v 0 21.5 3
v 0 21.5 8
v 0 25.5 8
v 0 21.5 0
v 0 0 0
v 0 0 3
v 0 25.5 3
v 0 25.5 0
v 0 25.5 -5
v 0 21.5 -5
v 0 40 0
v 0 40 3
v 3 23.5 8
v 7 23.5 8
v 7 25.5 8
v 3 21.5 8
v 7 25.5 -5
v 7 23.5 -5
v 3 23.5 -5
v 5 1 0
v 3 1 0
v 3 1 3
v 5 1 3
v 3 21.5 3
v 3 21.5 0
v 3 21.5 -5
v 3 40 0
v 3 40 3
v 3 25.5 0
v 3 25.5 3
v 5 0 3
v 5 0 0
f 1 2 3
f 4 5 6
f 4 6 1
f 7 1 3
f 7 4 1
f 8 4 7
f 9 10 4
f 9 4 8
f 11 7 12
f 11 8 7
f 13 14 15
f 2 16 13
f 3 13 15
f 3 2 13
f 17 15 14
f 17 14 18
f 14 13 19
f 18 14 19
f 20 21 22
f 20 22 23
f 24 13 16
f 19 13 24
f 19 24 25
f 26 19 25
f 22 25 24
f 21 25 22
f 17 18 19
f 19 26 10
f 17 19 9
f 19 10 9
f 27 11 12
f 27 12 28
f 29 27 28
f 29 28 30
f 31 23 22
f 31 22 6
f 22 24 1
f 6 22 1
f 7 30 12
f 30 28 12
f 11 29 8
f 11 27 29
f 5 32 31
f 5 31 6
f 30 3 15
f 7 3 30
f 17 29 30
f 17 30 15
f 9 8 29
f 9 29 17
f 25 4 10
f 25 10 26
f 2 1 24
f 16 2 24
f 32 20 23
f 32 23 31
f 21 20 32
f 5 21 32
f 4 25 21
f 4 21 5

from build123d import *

# Parameters (mm, degrees)
BOSS_EXTRUDE1_DEPTH = 3
SKETCH2_W           = 3
SKETCH2_H           = 4
BOSS_EXTRUDE2_DEPTH = 5
SKETCH5_W           = 13
SKETCH5_H           = 2
BOSS_EXTRUDE4_DEPTH = 4


with BuildPart() as part:
    # Sketch1 → Boss-Extrude1 (new body)
    with BuildSketch(Plane.XY):
        Polygon((0, 0), (0, 40), (3, 40), (3, 1), (5, 1), (5, 0), align=None)
    extrude(amount=BOSS_EXTRUDE1_DEPTH)

    # Sketch2 → Boss-Extrude2 (add)
    with BuildSketch(Plane.XY.offset(3)):
        with Locations((1.5, 23.5)):
            Rectangle(SKETCH2_W, SKETCH2_H)
    boss_extrude2 = extrude(amount=BOSS_EXTRUDE2_DEPTH)

    # Mirror1: Boss-Extrude2 across plane
    add(boss_extrude2.mirror(Plane.XY.offset(1.5)))

    # Sketch5 → Boss-Extrude4 (add)
    with BuildSketch(Plane(origin=(3, 0, 0), x_dir=(0, 0, -1), z_dir=(1, 0, 0))):
        with Locations((-1.5, 24.5)):
            Rectangle(SKETCH5_W, SKETCH5_H)
    extrude(amount=BOSS_EXTRUDE4_DEPTH)


solid = part.part
